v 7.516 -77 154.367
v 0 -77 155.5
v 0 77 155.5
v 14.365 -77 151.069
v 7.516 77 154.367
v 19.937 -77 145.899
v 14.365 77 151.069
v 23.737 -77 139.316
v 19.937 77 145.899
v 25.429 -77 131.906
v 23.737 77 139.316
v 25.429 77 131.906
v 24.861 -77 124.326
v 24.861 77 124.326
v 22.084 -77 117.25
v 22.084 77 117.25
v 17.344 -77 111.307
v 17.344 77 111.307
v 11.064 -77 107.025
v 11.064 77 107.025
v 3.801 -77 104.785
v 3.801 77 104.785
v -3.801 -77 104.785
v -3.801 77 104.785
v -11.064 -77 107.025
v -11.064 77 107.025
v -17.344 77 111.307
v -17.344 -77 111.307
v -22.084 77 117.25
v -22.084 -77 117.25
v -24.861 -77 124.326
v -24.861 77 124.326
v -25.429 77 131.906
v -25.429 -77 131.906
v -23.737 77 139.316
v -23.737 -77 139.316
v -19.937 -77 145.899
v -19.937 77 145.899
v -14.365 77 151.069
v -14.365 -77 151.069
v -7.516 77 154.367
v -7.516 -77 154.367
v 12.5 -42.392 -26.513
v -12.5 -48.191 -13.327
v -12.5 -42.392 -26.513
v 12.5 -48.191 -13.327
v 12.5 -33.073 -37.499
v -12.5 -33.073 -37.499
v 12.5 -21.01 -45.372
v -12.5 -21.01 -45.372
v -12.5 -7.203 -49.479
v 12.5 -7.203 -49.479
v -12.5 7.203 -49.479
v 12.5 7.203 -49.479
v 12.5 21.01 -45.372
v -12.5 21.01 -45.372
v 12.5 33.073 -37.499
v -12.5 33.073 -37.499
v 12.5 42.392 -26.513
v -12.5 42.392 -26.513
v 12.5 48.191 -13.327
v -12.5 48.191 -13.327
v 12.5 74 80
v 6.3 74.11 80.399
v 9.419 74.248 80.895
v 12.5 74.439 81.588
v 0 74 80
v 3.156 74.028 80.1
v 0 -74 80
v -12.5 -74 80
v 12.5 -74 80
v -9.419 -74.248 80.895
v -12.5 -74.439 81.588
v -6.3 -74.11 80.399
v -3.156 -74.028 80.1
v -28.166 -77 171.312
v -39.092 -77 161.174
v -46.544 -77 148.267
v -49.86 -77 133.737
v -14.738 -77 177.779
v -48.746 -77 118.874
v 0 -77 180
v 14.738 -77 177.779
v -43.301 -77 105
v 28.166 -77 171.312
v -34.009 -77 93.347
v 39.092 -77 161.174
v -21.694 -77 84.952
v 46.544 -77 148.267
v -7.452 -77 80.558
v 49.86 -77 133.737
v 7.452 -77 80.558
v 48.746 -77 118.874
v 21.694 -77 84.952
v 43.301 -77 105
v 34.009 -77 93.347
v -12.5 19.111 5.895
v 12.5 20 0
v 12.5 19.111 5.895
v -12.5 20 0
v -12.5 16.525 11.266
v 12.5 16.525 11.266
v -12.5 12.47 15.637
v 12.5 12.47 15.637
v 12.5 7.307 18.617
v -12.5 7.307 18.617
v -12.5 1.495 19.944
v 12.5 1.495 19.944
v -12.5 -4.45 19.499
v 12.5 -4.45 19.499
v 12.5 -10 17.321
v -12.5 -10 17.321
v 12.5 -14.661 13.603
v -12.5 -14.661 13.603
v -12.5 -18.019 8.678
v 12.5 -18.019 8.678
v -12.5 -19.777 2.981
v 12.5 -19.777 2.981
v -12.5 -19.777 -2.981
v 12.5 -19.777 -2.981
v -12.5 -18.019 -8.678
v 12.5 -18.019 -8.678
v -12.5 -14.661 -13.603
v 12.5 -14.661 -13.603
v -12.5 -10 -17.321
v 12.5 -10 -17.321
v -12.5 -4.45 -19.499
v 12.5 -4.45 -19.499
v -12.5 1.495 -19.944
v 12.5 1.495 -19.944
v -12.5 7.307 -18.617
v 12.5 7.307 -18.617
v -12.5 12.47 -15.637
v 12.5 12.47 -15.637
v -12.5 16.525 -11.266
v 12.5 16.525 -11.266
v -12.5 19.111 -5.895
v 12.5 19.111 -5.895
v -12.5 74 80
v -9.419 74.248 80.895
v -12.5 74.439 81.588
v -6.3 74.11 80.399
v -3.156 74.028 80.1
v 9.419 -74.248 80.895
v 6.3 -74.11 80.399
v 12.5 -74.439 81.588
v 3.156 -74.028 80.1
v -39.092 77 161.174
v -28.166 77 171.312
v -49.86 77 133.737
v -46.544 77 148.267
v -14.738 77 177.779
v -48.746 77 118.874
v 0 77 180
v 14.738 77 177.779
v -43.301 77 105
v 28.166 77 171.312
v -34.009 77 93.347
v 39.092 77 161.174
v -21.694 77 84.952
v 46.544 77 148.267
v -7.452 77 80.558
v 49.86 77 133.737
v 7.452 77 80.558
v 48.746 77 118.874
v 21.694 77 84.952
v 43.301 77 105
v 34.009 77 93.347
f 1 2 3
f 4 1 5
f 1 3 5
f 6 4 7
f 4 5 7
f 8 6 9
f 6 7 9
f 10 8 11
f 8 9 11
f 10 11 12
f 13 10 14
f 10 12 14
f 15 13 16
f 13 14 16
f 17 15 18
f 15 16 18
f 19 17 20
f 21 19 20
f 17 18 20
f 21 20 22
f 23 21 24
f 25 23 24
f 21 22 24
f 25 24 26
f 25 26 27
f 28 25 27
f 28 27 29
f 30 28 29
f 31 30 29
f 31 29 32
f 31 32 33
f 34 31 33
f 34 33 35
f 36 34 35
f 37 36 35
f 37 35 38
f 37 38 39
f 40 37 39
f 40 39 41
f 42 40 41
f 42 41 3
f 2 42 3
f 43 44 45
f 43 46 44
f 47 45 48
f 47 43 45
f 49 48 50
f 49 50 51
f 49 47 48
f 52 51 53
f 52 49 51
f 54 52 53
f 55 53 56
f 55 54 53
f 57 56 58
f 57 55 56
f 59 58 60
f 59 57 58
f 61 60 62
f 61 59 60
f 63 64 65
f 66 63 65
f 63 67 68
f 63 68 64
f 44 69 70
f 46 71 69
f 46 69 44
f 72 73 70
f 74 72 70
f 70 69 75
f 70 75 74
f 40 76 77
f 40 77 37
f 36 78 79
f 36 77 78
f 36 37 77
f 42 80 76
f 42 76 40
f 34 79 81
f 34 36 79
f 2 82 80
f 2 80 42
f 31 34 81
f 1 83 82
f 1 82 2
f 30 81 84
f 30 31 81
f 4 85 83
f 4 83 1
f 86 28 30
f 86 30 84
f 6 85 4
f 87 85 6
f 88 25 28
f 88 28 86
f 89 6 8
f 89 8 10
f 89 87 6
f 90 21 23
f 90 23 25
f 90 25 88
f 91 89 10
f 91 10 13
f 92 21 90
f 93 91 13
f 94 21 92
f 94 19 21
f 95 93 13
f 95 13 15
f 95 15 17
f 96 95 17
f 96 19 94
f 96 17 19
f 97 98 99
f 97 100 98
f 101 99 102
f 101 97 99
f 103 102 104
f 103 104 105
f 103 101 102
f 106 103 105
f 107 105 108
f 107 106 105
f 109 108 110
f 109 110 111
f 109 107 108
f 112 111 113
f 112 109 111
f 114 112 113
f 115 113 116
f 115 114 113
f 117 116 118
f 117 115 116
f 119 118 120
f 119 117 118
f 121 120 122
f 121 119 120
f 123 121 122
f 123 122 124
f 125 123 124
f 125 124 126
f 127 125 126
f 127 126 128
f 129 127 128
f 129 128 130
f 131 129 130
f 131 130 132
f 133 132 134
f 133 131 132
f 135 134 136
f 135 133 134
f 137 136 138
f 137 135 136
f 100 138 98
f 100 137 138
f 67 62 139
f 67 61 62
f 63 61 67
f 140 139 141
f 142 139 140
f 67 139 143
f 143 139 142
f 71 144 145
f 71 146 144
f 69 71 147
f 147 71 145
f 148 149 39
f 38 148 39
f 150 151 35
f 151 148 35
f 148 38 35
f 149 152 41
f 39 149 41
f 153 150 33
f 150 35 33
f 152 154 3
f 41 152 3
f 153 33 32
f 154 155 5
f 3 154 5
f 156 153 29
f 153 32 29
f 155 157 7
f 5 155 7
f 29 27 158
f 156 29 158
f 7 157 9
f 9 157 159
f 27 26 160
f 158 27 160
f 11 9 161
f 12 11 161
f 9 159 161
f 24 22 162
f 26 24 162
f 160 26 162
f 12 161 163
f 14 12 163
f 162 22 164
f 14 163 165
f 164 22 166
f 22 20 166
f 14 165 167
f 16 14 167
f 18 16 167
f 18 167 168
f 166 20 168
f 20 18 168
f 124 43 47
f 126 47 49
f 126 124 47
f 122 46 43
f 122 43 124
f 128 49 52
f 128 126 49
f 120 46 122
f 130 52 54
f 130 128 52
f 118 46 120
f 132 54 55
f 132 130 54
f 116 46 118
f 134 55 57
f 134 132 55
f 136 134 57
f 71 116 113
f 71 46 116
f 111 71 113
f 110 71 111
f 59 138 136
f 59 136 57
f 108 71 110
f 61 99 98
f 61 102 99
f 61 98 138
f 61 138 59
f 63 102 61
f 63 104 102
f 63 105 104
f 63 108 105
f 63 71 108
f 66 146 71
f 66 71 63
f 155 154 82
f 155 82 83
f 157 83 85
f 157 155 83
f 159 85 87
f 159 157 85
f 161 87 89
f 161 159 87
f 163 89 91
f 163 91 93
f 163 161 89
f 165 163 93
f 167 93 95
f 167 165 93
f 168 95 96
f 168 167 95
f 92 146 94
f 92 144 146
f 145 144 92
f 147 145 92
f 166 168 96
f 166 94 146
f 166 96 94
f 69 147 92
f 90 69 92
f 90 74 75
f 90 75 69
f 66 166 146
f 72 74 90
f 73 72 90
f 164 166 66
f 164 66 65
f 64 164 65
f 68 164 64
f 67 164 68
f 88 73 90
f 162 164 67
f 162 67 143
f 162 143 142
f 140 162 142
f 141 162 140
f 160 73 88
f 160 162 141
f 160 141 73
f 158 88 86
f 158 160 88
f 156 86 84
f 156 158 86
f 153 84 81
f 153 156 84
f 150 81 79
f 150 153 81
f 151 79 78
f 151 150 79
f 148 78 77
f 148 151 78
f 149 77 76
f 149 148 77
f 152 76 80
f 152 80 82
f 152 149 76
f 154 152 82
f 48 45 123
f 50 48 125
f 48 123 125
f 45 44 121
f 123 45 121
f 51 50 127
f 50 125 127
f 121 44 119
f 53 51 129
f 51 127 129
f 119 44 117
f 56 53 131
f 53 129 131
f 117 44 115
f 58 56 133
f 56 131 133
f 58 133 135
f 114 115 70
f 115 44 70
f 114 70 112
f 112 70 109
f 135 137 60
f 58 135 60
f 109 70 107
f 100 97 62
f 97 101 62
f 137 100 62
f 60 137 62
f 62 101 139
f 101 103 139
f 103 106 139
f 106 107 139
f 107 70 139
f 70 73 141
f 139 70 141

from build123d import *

# Parameters (mm, degrees)
F0_R     = 20
F1_DEPTH = 12.5
F0_W     = 154
F0_H     = 24.5


# Not quite as in the source:
# - ends of sketch curves that miss each other by under 0.0002 mm in the source are joined


with BuildPart() as f1:
    # F0 (on Right) → F1 (new body, symmetric)
    with BuildSketch(Plane.YZ):
        with BuildLine():
            Line((73.9999998675, 80), (-73.9999998675, 80))
            Line((-73.9999998675, 80), (-48.191225, -13.326883))
            ThreePointArc((-48.191225, -13.326883), (0, -50), (48.1912252169, -13.32688306))
            Line((48.1912252169, -13.32688306), (73.9999998675, 80))
        make_face()
        Circle(F0_R, mode=Mode.SUBTRACT)
        Polygon((-77, 104.5), (-77, 90.848274), (-73.9999998675, 80), (73.9999998675, 80), (77, 90.848274), (77, 104.5), align=None)
    extrude(amount=F1_DEPTH, both=True)

    # F0 (on Right) → F2 (revolve)
    with BuildSketch(Plane.YZ):
        with Locations((0, 167.75)):
            Rectangle(F0_W, F0_H)
    revolve(axis=Axis((0, 0, 130), (0, 1, 0)))


solid = f1.part
